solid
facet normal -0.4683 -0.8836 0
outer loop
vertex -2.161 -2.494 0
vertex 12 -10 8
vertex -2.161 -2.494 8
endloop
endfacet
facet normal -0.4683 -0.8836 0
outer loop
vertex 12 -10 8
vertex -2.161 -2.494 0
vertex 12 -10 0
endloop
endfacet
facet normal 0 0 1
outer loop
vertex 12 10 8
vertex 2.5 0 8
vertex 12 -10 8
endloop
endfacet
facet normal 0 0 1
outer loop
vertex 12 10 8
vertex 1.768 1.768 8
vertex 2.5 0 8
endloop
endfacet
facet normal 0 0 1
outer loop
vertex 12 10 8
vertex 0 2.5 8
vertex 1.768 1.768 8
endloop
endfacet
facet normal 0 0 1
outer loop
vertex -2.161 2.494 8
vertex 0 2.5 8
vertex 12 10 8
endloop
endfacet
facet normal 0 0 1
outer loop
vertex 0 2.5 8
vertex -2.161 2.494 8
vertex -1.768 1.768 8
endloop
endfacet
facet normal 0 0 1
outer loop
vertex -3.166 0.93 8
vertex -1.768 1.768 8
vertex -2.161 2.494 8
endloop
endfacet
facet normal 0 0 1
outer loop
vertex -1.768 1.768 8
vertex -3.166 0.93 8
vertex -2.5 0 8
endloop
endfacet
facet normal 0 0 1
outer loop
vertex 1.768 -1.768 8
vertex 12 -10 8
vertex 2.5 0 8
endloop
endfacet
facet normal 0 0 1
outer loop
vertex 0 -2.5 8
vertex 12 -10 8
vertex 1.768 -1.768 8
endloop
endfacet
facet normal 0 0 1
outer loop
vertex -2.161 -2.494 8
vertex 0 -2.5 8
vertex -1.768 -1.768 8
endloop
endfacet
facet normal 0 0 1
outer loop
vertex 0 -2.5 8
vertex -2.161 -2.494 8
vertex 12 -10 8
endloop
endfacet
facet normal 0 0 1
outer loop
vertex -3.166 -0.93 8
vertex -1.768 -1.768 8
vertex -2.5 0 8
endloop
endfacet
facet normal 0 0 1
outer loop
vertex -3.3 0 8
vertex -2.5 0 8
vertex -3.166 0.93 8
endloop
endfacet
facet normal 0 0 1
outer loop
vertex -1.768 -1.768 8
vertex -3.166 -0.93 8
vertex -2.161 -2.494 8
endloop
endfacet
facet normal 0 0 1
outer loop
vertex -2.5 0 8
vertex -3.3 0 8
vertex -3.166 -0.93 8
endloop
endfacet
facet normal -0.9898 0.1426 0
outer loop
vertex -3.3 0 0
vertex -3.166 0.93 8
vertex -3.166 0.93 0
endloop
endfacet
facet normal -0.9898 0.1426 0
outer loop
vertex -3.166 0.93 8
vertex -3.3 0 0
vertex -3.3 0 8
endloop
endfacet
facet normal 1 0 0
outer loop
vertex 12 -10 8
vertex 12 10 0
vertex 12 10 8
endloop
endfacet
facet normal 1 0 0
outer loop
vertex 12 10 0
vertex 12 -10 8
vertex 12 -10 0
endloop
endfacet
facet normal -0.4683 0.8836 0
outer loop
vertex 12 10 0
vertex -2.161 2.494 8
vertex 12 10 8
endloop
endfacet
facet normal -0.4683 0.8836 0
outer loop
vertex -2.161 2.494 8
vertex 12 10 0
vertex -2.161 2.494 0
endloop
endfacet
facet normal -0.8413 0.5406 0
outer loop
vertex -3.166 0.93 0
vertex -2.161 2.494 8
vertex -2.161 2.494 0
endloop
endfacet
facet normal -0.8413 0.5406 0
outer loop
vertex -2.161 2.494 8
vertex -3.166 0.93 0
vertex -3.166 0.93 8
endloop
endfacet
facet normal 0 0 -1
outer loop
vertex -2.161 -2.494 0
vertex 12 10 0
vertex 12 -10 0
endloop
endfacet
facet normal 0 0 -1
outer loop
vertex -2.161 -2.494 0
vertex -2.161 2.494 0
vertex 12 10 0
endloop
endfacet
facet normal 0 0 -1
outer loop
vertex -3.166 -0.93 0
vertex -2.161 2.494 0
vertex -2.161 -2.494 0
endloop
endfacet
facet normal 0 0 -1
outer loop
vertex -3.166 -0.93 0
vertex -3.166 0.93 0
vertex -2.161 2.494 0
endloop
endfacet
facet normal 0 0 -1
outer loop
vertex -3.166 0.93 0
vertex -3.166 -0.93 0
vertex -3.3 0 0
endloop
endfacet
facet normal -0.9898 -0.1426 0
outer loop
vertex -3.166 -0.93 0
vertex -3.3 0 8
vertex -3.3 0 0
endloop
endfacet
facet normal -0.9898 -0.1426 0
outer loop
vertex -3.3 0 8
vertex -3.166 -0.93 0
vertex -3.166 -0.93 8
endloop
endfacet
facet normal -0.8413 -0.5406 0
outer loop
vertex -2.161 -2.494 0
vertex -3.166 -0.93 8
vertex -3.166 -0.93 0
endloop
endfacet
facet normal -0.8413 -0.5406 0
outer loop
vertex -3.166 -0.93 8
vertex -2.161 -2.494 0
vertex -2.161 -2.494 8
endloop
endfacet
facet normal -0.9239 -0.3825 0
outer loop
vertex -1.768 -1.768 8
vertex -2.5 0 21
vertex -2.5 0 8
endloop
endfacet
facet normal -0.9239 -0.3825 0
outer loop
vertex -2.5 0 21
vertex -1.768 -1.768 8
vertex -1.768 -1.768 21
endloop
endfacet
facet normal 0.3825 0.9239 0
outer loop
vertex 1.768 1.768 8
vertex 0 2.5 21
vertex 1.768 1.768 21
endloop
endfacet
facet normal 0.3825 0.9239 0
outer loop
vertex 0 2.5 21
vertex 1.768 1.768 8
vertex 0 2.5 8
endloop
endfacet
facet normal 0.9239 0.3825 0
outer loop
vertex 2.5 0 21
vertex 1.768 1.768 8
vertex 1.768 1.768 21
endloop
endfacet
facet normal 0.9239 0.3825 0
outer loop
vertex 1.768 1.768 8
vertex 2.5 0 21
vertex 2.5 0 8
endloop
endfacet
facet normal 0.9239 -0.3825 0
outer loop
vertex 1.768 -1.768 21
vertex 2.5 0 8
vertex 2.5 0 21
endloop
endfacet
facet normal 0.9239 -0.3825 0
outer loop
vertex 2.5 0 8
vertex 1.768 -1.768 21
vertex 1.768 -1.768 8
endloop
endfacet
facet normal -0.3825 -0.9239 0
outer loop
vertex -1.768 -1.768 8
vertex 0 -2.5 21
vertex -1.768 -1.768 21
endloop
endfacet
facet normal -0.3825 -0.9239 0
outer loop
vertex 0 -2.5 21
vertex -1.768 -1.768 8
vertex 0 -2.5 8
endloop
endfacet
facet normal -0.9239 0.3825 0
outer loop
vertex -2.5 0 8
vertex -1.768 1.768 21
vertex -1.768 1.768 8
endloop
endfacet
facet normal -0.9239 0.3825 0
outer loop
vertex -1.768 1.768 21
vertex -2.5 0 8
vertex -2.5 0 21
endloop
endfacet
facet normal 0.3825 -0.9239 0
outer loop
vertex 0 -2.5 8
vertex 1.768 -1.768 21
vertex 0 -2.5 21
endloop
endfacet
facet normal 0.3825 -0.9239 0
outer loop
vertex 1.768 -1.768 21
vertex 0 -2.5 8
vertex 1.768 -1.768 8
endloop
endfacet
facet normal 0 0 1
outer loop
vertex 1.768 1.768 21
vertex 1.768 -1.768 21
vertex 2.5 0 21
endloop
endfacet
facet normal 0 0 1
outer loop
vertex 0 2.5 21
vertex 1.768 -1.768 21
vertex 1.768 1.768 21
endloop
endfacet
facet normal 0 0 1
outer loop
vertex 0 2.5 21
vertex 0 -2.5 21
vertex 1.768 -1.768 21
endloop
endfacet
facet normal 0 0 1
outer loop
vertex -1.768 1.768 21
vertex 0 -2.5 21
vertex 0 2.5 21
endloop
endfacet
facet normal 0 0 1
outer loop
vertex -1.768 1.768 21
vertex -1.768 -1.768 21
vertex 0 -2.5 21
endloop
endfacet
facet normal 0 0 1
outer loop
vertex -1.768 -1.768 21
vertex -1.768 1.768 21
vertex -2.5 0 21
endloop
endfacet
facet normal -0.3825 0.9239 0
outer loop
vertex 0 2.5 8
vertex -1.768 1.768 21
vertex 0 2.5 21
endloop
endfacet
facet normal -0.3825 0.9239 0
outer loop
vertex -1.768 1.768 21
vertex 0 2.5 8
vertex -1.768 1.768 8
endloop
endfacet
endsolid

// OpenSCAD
back_thick = 8;
back_height = 12;
back_radius = 10;
cyl_height = 13;
outer_radius = 3.3;
inner_radius = 2.5;

union() {
  hull() {
    linear_extrude(height=back_thick) {
      polygon(points=[[-outer_radius, 0], [back_height, -back_radius], [back_height, back_radius]]);
    }
    cylinder(h=back_thick, r=outer_radius, center=false);
  }
  cylinder(h=back_thick+cyl_height, r=inner_radius, center=false);
}
